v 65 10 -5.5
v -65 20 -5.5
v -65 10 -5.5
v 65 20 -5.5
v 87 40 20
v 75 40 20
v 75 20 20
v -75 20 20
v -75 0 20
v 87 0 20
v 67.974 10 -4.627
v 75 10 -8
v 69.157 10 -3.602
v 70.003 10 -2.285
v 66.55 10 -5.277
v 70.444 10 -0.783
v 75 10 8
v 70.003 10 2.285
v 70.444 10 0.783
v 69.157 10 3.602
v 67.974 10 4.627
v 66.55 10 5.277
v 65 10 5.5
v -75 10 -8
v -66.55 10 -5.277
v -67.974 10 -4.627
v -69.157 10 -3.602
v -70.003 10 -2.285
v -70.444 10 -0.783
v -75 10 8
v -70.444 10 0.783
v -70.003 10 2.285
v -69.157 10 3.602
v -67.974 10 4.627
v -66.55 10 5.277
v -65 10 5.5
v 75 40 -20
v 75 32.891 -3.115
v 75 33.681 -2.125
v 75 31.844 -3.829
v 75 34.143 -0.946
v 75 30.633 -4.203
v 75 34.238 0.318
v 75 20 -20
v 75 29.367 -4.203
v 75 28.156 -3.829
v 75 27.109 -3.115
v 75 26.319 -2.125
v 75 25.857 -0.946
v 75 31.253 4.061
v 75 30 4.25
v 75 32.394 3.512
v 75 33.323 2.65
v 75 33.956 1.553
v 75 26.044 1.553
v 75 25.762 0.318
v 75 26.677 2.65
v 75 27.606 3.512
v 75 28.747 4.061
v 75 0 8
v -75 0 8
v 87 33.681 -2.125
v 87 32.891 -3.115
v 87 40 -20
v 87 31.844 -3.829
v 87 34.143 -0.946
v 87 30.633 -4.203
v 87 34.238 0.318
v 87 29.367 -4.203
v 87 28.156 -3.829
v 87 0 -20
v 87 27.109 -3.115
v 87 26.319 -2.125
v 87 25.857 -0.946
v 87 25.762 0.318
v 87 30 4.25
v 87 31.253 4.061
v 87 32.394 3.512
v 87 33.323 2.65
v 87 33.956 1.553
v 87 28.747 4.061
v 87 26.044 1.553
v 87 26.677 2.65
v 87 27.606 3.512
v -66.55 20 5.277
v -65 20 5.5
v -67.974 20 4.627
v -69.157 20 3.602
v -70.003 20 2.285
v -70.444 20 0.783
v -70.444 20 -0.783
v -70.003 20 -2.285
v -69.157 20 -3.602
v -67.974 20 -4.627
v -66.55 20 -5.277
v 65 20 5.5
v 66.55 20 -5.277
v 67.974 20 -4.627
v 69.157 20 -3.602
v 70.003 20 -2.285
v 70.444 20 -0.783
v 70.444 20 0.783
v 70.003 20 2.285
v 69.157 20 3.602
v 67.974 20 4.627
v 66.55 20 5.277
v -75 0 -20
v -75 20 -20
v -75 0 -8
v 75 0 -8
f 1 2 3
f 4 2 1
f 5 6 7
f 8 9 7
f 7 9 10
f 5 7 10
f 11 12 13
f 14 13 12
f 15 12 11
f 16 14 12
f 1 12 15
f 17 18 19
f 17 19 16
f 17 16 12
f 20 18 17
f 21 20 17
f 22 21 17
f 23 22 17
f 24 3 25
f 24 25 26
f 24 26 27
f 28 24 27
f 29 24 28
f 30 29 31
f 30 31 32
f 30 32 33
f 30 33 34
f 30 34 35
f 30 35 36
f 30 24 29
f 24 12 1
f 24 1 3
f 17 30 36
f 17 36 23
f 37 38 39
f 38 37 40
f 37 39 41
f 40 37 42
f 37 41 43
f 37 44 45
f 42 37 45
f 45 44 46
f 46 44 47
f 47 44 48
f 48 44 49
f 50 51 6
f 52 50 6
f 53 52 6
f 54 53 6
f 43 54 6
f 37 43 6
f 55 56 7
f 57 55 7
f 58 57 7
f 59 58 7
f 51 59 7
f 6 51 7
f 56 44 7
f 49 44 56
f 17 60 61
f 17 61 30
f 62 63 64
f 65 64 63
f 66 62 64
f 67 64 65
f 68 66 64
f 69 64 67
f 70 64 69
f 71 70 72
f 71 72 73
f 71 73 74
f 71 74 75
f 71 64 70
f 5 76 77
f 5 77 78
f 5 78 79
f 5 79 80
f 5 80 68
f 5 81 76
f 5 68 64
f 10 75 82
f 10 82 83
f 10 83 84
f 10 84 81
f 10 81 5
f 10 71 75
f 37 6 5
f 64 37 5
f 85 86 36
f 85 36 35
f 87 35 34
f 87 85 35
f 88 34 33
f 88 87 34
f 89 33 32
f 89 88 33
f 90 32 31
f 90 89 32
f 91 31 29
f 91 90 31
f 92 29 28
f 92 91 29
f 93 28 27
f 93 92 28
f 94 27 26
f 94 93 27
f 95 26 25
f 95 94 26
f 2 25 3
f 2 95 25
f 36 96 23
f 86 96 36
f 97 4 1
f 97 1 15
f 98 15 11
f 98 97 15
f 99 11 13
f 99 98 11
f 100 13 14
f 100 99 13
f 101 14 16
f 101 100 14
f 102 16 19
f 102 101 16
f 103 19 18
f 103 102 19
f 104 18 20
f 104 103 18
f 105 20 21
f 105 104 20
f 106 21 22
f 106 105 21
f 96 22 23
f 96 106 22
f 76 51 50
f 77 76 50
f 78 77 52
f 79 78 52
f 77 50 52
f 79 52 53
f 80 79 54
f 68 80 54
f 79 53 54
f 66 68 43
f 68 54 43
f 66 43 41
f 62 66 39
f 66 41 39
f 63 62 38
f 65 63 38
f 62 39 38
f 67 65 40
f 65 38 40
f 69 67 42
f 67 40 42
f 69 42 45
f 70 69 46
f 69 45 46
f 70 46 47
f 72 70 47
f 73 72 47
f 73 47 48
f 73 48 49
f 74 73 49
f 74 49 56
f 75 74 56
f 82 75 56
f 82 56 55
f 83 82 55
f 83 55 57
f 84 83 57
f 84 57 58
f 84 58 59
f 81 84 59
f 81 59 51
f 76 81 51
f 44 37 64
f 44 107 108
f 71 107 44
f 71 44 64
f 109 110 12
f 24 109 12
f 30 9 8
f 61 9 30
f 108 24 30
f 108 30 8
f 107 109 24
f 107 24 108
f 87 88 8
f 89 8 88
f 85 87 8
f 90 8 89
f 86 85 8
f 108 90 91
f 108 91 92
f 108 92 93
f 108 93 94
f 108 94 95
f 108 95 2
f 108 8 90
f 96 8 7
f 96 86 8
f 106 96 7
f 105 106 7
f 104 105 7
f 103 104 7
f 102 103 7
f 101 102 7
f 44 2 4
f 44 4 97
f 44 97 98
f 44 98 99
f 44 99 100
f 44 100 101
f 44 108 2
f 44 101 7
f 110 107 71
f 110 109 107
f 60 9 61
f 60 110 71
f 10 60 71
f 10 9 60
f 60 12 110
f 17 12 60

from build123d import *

# Parameters (mm, degrees)
SKETCH_1_W              = 150
SKETCH_1_H              = 40
EXTRUDE_1_DEPTH         = 20
SKETCH_3_W              = 12
SKETCH_3_H              = 40
EXTRUDE_2_DEPTH         = 40
CUT_EXTRUDE_1_DEPTH     = 40
HOLE_WIZARD_M10_1_D     = 8.5
HOLE_WIZARD_M10_1_DEPTH = 24.5
HOLE_WIZARD_M10_1_TIP   = 2.553657631
SKETCH_7_W              = 16
SKETCH_7_H              = 10
CUT_EXTRUDE_2_DEPTH     = 150


with BuildPart() as part:
    # 草图1 → 凸台-拉伸1 (new body)
    with BuildSketch(Plane(origin=(0, 0, 0), x_dir=(1, 0, 0), z_dir=(0, 1, 0))):
        Rectangle(SKETCH_1_W, SKETCH_1_H)
    extrude(amount=EXTRUDE_1_DEPTH)

    # 草图3 → 凸台-拉伸2 (add)
    with BuildSketch(Plane.XZ):
        with Locations((81, 0)):
            Rectangle(SKETCH_3_W, SKETCH_3_H)
    extrude(amount=-EXTRUDE_2_DEPTH)

    # 草图4 → 切除-拉伸1 (cut)
    with BuildSketch(Plane(origin=(0, 20, 0), x_dir=(1, 0, 0), z_dir=(0, 1, 0))):
        with BuildLine():
            Line((-65, 5.5), (65, 5.5))
            ThreePointArc((65, 5.5), (70.5, 0), (65, -5.5))
            Line((65, -5.5), (-65, -5.5))
            ThreePointArc((-65, -5.5), (-70.5, 0), (-65, 5.5))
        make_face()
    extrude(amount=-CUT_EXTRUDE_1_DEPTH, mode=Mode.SUBTRACT)

    # M10 螺纹孔1
    with Locations(Plane(origin=(87, 0, 0), x_dir=(0, 0, -1), z_dir=(1, 0, 0))):
        with Locations((0, 30)):
            Hole(HOLE_WIZARD_M10_1_D / 2, depth=HOLE_WIZARD_M10_1_DEPTH)
            with Locations((0, 0, -(HOLE_WIZARD_M10_1_DEPTH + HOLE_WIZARD_M10_1_TIP / 2))):  # 118° drill point
                Cone(0, HOLE_WIZARD_M10_1_D / 2, HOLE_WIZARD_M10_1_TIP, mode=Mode.SUBTRACT)

    # 草图7 → 切除-拉伸2 (cut)
    with BuildSketch(Plane.ZY.offset(75)):
        with Locations((0, 5)):
            Rectangle(SKETCH_7_W, SKETCH_7_H)
    extrude(amount=-CUT_EXTRUDE_2_DEPTH, mode=Mode.SUBTRACT)


solid = part.part
